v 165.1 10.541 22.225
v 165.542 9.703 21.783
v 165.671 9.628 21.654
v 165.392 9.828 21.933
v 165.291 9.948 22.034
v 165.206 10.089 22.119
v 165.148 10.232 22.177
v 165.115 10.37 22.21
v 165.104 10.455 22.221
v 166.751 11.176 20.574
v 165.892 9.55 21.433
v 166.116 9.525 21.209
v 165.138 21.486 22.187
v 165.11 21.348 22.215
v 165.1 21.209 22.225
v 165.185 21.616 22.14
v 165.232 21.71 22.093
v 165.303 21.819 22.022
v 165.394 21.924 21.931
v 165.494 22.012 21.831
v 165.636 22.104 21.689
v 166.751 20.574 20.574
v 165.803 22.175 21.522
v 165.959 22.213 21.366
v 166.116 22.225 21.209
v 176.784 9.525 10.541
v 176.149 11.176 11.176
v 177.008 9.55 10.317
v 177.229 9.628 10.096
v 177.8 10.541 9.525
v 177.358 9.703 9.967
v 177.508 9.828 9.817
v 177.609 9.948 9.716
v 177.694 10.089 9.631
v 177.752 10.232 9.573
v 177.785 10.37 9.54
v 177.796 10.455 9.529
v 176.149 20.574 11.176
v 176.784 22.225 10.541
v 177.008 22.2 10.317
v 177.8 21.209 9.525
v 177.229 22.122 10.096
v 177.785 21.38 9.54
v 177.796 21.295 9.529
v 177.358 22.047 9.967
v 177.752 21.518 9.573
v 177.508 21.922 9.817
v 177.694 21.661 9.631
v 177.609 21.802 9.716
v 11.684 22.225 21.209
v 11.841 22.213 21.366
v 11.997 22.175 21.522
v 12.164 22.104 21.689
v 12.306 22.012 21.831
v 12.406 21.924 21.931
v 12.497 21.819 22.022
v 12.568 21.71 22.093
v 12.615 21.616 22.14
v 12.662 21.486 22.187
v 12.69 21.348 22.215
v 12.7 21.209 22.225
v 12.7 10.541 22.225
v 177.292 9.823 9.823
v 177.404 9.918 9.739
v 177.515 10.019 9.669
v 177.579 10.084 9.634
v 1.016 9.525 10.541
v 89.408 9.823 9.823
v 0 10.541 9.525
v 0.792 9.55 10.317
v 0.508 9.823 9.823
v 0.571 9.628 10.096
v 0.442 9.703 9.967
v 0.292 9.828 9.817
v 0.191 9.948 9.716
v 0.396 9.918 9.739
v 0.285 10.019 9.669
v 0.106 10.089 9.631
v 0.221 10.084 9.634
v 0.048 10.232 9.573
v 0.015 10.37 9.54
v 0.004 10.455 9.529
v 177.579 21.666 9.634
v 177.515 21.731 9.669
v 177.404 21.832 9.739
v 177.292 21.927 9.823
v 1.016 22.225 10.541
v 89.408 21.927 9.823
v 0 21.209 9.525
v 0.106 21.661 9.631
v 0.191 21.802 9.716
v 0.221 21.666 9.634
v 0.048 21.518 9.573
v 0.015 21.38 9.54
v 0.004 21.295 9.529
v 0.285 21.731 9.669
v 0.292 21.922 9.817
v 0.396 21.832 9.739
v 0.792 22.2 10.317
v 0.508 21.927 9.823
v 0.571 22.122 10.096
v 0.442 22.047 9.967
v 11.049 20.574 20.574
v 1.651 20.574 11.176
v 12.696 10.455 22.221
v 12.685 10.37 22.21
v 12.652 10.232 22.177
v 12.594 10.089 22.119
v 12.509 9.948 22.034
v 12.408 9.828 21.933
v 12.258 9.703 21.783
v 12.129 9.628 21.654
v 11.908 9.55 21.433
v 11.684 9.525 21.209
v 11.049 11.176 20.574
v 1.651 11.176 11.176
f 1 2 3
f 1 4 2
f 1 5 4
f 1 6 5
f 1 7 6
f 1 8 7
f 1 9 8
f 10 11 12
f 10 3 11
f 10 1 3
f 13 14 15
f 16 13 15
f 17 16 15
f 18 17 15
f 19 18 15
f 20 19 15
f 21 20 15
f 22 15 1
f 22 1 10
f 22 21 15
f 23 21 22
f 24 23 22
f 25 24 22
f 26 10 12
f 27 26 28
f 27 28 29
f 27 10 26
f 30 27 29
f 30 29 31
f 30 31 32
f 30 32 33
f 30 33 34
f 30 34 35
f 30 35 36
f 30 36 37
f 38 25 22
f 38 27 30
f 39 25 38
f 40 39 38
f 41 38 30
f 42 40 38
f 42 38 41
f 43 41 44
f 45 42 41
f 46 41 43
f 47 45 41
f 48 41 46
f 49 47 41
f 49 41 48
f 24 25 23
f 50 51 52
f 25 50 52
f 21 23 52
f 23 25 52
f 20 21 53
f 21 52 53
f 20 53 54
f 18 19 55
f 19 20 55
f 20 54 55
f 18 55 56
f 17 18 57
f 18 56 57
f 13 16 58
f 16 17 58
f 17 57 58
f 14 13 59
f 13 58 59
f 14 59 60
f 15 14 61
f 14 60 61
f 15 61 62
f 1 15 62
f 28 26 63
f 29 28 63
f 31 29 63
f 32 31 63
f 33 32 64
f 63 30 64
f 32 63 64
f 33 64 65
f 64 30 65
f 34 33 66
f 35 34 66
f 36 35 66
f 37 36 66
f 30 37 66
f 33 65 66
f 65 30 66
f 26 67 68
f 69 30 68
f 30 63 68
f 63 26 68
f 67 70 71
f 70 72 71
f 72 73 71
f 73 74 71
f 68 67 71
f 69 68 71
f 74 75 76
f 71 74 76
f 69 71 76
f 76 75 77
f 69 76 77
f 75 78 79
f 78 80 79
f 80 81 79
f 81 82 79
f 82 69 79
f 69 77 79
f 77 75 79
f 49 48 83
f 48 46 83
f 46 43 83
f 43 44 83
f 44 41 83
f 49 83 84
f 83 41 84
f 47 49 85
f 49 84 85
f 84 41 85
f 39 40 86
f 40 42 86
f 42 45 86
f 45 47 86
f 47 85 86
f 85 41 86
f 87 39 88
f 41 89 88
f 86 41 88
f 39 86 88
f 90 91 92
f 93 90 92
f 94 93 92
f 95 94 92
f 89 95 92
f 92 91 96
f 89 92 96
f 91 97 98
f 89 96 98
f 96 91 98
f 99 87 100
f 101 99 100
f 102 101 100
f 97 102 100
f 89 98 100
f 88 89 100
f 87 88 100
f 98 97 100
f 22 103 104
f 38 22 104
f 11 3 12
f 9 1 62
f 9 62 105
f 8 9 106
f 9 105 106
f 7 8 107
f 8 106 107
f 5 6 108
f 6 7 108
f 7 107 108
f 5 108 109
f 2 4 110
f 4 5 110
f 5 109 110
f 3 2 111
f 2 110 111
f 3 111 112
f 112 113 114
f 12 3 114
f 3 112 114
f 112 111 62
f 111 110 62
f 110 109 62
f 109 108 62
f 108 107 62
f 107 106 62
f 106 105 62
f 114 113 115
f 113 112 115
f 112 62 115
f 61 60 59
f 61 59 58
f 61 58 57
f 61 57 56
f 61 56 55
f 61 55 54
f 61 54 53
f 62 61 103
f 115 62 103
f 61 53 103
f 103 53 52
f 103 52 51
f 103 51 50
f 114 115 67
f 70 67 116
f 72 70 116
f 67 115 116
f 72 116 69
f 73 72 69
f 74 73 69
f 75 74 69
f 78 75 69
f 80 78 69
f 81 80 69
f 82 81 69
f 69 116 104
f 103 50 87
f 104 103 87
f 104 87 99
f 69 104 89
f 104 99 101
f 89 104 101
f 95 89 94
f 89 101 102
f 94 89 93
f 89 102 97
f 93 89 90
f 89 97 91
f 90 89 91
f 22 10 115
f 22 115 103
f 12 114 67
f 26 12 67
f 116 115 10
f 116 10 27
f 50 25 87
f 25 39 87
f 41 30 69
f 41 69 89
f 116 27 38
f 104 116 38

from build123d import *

# Parameters (mm, degrees)
SKETCH1_W           = 23.495
SKETCH1_H           = 23.495
BOSS_EXTRUDE1_DEPTH = 177.8
SCALE1_SCALE_X      = 1
SCALE1_SCALE_Y      = 0.4
SCALE1_SCALE_Z      = 0.4
CUT_EXTRUDE3_REACH  = 181.633


with BuildPart() as part:
    # Sketch1 → Boss-Extrude1 (new body)
    with BuildSketch(Plane(origin=(0, 0, 0), x_dir=(0, 0, -1), z_dir=(1, 0, 0))):
        with BuildLine():
            Line((0, 2.54), (0, 29.21))
            ThreePointArc((0, 29.21), (-0.743948776, 31.006051224), (-2.54, 31.75))
            Line((-2.54, 31.75), (-29.21, 31.75))
            ThreePointArc((-29.21, 31.75), (-31.006051224, 31.006051224), (-31.75, 29.21))
            Line((-31.75, 29.21), (-31.75, 2.54))
            ThreePointArc((-31.75, 2.54), (-31.006051224, 0.743948776), (-29.21, 0))
            Line((-29.21, 0), (-2.54, 0))
            ThreePointArc((-2.54, 0), (-0.743948776, 0.743948776), (0, 2.54))
        make_face()
        with Locations((-15.875, 15.875)):
            Rectangle(SKETCH1_W, SKETCH1_H, mode=Mode.SUBTRACT)
    extrude(amount=BOSS_EXTRUDE1_DEPTH)


with BuildPart() as part_1:
    # Scale1: scaled about (88.9, 15.875, 15.875)
    add(part.part.scale((SCALE1_SCALE_X, SCALE1_SCALE_Y, SCALE1_SCALE_Z), about=(88.9, 15.875, 15.875)))

    # Sketch3 → Cut-Extrude3 (cut, up to next)
    with BuildSketch(Plane(origin=(0, 22.225, 0), x_dir=(1, 0, 0), z_dir=(0, 1, 0)), mode=Mode.PRIVATE) as cut_extrude3_sk1:
        Polygon((0, -9.525), (0, -22.225), (12.7, -22.225), align=None)
    cut_extrude3_tool1 = extrude(cut_extrude3_sk1.sketch, amount=-CUT_EXTRUDE3_REACH, mode=Mode.PRIVATE) & part_1.part
    # Sketch3 → Cut-Extrude3 (cut, up to next)
    with BuildSketch(Plane(origin=(0, 22.225, 0), x_dir=(1, 0, 0), z_dir=(0, 1, 0)), mode=Mode.PRIVATE) as cut_extrude3_sk2:
        Polygon((177.8, -22.225), (165.1, -22.225), (177.8, -9.525), align=None)
    cut_extrude3_tool2 = extrude(cut_extrude3_sk2.sketch, amount=-CUT_EXTRUDE3_REACH, mode=Mode.PRIVATE) & part_1.part
    add(cut_extrude3_tool1.solids().sort_by_distance((4.233333, 22.225, 17.991667))[0], mode=Mode.SUBTRACT)
    add(cut_extrude3_tool2.solids().sort_by_distance((173.566667, 22.225, 17.991667))[0], mode=Mode.SUBTRACT)


solid = part_1.part
